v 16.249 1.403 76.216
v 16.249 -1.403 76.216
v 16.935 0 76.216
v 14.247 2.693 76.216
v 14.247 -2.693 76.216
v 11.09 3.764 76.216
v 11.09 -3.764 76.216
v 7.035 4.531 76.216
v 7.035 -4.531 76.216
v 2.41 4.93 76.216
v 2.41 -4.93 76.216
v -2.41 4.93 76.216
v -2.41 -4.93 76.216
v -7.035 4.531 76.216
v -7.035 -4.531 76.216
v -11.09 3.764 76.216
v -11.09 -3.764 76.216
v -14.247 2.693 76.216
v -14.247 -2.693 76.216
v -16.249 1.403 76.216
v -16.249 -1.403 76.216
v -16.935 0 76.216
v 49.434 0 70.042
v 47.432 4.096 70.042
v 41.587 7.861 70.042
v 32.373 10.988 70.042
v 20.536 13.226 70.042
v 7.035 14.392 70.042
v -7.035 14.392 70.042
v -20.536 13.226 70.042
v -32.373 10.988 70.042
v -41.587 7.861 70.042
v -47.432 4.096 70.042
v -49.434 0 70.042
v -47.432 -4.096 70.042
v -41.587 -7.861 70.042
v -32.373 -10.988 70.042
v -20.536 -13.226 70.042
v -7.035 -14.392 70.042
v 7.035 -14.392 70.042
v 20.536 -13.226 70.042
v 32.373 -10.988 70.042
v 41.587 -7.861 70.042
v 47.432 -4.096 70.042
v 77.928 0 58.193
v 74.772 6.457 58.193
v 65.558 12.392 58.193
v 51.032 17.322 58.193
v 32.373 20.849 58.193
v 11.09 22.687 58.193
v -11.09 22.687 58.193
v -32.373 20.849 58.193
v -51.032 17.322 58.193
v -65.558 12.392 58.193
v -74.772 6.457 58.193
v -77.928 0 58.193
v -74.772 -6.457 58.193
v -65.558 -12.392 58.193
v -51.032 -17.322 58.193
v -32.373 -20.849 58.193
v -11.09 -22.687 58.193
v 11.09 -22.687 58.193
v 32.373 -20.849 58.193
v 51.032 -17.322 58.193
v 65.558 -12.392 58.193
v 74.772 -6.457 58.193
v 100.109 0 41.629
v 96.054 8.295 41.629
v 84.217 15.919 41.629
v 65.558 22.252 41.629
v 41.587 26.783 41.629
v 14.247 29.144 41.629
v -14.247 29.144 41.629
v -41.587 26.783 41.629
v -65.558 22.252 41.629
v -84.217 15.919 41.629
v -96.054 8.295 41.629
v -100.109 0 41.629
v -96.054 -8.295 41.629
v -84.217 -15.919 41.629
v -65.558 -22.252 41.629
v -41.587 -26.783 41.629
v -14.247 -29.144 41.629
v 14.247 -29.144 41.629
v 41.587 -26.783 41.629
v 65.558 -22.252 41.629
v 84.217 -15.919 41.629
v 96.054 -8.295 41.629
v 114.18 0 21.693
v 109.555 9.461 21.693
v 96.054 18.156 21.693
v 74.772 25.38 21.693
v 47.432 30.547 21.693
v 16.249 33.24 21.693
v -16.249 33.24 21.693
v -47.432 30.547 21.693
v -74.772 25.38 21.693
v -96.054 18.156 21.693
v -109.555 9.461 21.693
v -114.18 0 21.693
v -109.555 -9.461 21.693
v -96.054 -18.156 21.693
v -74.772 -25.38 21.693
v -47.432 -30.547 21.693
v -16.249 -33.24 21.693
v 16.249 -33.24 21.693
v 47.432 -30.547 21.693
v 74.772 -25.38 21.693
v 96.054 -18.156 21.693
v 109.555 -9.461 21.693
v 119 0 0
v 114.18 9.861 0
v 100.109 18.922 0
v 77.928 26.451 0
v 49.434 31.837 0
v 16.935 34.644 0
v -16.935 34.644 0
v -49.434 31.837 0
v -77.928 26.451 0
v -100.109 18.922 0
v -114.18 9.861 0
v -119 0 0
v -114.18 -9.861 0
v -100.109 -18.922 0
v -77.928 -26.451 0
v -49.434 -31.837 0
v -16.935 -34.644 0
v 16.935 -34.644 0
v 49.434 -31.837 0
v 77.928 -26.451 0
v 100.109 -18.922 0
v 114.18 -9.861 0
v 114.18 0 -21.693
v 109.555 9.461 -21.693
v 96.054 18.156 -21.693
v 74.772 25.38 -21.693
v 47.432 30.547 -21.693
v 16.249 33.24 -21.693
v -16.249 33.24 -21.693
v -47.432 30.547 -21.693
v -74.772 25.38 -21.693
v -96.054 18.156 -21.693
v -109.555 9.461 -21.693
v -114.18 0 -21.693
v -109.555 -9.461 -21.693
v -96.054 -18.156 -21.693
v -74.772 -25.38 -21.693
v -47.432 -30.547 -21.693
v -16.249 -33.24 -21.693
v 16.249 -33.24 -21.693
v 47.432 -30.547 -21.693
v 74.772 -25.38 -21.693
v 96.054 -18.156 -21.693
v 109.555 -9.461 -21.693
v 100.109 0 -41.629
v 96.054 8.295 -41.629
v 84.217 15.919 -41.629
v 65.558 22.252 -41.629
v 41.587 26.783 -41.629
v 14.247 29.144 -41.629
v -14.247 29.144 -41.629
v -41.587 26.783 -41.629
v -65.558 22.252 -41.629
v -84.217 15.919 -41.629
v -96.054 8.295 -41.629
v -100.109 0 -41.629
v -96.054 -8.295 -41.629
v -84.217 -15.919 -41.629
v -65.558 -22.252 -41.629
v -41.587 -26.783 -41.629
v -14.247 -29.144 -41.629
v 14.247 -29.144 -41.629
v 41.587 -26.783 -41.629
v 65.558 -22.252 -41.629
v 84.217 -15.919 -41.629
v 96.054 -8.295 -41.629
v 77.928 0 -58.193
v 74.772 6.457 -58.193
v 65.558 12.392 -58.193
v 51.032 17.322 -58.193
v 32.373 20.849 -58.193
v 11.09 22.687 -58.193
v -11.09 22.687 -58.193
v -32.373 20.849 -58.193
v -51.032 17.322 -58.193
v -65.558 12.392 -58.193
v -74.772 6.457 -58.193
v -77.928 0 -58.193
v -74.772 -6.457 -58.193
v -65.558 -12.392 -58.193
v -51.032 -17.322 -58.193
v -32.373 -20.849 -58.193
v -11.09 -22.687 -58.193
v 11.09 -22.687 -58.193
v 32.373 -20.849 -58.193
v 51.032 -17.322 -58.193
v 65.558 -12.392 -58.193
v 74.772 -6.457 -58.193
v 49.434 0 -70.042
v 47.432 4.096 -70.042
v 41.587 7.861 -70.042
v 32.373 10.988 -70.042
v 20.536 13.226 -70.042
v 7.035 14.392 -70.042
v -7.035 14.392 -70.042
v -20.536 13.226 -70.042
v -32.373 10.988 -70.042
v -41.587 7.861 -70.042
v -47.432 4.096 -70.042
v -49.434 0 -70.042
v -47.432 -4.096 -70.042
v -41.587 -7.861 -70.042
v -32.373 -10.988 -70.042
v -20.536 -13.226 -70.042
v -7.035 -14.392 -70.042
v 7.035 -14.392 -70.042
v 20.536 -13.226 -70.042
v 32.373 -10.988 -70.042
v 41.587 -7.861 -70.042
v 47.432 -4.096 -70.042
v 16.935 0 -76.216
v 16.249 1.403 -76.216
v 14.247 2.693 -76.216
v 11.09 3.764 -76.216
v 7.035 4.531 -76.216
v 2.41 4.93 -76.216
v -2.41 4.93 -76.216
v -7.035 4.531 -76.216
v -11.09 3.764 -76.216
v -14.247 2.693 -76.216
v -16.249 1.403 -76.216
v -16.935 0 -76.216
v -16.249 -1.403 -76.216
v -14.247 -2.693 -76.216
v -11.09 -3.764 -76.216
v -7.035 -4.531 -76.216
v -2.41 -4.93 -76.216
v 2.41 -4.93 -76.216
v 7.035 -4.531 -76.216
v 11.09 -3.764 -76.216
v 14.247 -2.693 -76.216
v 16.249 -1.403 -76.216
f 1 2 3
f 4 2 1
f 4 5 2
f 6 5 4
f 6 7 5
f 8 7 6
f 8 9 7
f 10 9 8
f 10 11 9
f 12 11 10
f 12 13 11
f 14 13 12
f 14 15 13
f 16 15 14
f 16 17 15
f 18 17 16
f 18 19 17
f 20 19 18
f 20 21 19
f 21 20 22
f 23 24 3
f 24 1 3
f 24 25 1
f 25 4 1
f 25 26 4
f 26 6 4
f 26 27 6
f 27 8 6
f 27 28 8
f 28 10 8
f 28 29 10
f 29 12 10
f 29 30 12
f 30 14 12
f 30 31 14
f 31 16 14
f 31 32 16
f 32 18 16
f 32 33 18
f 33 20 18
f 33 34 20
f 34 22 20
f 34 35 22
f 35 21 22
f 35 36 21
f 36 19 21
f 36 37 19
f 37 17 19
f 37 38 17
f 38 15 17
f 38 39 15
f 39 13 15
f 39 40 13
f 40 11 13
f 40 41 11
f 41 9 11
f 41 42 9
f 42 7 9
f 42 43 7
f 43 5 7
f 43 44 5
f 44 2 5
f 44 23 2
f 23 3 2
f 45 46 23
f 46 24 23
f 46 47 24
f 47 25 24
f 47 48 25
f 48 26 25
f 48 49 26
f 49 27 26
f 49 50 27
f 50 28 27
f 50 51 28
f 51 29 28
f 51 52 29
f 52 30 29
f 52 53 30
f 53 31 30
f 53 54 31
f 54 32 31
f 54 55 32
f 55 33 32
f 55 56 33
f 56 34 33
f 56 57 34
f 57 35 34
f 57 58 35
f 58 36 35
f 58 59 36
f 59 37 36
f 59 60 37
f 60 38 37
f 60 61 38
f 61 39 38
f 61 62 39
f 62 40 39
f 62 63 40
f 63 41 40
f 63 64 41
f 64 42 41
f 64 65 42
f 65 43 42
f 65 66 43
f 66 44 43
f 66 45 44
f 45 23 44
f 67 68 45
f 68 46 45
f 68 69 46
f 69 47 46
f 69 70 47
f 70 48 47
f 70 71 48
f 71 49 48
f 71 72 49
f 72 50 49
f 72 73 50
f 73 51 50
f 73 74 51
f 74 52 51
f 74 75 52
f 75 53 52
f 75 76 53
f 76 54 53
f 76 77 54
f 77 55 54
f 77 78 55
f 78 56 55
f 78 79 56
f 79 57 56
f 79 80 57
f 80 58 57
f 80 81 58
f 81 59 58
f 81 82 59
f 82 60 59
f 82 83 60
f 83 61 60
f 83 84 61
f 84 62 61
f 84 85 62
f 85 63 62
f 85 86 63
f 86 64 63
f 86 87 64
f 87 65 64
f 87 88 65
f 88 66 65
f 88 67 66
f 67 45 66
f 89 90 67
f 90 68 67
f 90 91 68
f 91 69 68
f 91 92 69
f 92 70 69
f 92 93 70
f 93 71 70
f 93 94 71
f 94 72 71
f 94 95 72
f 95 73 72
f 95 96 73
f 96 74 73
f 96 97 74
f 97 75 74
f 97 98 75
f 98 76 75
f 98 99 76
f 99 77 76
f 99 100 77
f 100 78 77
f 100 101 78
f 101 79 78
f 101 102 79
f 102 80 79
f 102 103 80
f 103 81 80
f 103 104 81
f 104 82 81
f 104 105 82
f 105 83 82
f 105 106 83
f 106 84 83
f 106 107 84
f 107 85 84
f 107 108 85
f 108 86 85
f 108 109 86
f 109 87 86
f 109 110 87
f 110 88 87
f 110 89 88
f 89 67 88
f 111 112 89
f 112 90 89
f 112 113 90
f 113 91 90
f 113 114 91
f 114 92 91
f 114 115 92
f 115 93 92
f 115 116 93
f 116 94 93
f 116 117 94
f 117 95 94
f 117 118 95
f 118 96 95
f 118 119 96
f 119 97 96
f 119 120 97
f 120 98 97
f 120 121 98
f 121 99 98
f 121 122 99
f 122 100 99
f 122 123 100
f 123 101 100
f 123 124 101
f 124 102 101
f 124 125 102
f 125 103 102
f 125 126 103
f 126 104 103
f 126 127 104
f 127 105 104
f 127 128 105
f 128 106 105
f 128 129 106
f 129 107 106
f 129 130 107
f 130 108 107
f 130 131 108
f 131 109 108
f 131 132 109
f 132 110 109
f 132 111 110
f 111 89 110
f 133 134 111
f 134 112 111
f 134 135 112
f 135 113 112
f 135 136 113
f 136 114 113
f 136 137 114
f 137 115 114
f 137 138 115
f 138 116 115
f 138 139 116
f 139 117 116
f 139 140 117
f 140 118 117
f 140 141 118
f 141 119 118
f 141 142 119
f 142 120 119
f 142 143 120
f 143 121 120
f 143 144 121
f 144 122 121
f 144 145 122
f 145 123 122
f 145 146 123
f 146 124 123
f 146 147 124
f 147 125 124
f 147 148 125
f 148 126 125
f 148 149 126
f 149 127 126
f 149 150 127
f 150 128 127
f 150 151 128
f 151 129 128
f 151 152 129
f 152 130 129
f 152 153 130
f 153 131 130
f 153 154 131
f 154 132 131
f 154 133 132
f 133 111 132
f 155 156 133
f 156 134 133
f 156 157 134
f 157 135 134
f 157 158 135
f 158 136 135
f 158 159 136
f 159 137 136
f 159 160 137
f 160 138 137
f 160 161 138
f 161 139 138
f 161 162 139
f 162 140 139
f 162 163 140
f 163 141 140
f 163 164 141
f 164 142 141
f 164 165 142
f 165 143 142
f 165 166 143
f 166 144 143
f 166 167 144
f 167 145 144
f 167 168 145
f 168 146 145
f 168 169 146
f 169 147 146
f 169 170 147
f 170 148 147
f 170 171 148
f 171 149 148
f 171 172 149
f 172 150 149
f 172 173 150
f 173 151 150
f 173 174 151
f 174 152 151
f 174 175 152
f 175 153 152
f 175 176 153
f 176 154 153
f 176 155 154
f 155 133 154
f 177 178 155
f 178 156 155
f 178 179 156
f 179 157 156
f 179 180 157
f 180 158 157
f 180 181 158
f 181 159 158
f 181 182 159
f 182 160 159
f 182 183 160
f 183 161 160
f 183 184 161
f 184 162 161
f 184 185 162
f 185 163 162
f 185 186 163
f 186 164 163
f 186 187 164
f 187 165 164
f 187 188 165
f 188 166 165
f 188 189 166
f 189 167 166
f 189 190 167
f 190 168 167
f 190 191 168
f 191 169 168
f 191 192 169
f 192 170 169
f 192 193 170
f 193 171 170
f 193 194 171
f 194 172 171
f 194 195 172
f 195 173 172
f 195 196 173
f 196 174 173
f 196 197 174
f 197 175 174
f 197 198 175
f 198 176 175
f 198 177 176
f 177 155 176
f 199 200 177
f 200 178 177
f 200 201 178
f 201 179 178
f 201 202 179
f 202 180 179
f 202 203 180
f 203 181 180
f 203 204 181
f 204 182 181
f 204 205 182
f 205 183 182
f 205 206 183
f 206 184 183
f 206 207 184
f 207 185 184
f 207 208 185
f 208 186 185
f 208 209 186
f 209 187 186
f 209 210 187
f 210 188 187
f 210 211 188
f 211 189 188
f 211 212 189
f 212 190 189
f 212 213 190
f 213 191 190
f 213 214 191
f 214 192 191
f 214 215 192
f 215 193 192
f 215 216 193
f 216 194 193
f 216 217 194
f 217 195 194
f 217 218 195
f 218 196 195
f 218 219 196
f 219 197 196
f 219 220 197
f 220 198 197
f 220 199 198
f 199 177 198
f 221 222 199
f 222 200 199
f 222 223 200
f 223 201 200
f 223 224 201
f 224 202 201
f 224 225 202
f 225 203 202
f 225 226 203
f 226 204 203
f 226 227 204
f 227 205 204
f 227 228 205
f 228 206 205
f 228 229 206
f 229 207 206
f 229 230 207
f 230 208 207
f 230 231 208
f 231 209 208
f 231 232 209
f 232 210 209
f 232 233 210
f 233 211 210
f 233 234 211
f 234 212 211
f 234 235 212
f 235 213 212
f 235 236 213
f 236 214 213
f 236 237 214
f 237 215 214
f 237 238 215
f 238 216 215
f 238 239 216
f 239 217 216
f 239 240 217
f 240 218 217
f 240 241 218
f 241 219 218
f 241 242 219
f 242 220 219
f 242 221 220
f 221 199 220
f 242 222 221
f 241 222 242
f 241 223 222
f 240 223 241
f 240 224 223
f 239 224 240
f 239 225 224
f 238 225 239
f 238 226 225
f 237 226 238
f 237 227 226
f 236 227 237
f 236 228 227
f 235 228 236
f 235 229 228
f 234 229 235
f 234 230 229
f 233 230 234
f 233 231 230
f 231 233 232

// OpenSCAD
// Generated by SolidPython 1.0.1 on 2020-07-29 00:46:52


scale(v = [17, 5, 11]) {
	sphere(r = 7);
}
/***********************************************
*********      SolidPython code:      **********
************************************************
 
# import packages: SolidPython
from solid import *
from solid.utils import *
from itertools import chain, combinations, permutations


class Resize:

    def __init__(self, scad_file):
        self.scad_file = scad_file
        #self.scad_file = import_scad(scad_file)
        # cone/cylinder param:
        self.r1 = 0
        self.r2 = 0
        self.h = 0
        # rectangular prism param:
        self.w = 0
        self.l = 0
        # ellipse param:
        self.r = 0

    # import OpenScad code (file name corresponds to shape)


    # classify shape + parameters
    def assign(self, param1, param2, param3):
        if self.scad_file == 'cone.scad':
            self.r1 = param1
            self.r2 = param2
            self.h = param3
        elif self.scad_file == 'cylinder.scad':
            self.r1 = param1
            self.r2 = param2
            self.h = param3
        elif self.scad_file == 'rectangularPrism.scad':
            self.h = param1
            self.l = param2
            self.w = param3
        else:
            self.r = param1
            self.h = param2

    # resize parameters
    def iterate(self):
        x = range(3, 20, 2)
        i = 1
        if self.scad_file == 'cone.scad':
            tempList = list(permutations(x, 2))
            for temp in tempList:
                param1 = temp[0]
                param2 = temp[1]
                filepath = 'produced_scad_files/' + 'cone' + str(param1) + '_' + str(param2) + '_' + '.scad'
                scad_render_to_file(cylinder(h=param1, r1=param2, r2=0), filepath)

        elif self.scad_file == 'cylinder.scad':
            tempList = list(permutations(x, 3))
            for temp in tempList:
                param1 = temp[0]
                param2 = temp[1]
                filepath = 'produced_scad_files/' + 'cylinder' + str(param1) + '_' + str(param2) + '_' + '.scad'
                scad_render_to_file(cylinder(h=param1, r1=param2, r2=param2), filepath)

        elif self.scad_file == 'rectangularPrism.scad':
            tempList = list(permutations(x, 3))
            for temp in tempList:
                param1 = temp[0]
                param2 = temp[1]
                param3 = temp[2]
                filepath = 'produced_scad_files/' + 'rectangularPrism' + str(param1) + '_' + str(param2) + '_' + str(
                    param3) + '.scad'
                scad_render_to_file(cube(size=(param1, param2, param3)), filepath)

        elif self.scad_file == 'ellipse.scad':
            tempList = list(permutations(x, 4))
            for temp in tempList:
                param1 = temp[0]
                param2 = temp[1]
                param3 = temp[2]
                param4 = temp[3]
                filepath = 'produced_scad_files/' + 'ellipse' + str(param1) + '_' + str(param2) + '_' + str(param3) + '_' + str(param4) + '.scad'
                scad_render_to_file(scale([param1, param2, param3])(sphere(r=param4)), filepath)

    def render_to_scadfile(self):
        scad_render_to_file(scad, 'example.scad') 
 
************************************************/
